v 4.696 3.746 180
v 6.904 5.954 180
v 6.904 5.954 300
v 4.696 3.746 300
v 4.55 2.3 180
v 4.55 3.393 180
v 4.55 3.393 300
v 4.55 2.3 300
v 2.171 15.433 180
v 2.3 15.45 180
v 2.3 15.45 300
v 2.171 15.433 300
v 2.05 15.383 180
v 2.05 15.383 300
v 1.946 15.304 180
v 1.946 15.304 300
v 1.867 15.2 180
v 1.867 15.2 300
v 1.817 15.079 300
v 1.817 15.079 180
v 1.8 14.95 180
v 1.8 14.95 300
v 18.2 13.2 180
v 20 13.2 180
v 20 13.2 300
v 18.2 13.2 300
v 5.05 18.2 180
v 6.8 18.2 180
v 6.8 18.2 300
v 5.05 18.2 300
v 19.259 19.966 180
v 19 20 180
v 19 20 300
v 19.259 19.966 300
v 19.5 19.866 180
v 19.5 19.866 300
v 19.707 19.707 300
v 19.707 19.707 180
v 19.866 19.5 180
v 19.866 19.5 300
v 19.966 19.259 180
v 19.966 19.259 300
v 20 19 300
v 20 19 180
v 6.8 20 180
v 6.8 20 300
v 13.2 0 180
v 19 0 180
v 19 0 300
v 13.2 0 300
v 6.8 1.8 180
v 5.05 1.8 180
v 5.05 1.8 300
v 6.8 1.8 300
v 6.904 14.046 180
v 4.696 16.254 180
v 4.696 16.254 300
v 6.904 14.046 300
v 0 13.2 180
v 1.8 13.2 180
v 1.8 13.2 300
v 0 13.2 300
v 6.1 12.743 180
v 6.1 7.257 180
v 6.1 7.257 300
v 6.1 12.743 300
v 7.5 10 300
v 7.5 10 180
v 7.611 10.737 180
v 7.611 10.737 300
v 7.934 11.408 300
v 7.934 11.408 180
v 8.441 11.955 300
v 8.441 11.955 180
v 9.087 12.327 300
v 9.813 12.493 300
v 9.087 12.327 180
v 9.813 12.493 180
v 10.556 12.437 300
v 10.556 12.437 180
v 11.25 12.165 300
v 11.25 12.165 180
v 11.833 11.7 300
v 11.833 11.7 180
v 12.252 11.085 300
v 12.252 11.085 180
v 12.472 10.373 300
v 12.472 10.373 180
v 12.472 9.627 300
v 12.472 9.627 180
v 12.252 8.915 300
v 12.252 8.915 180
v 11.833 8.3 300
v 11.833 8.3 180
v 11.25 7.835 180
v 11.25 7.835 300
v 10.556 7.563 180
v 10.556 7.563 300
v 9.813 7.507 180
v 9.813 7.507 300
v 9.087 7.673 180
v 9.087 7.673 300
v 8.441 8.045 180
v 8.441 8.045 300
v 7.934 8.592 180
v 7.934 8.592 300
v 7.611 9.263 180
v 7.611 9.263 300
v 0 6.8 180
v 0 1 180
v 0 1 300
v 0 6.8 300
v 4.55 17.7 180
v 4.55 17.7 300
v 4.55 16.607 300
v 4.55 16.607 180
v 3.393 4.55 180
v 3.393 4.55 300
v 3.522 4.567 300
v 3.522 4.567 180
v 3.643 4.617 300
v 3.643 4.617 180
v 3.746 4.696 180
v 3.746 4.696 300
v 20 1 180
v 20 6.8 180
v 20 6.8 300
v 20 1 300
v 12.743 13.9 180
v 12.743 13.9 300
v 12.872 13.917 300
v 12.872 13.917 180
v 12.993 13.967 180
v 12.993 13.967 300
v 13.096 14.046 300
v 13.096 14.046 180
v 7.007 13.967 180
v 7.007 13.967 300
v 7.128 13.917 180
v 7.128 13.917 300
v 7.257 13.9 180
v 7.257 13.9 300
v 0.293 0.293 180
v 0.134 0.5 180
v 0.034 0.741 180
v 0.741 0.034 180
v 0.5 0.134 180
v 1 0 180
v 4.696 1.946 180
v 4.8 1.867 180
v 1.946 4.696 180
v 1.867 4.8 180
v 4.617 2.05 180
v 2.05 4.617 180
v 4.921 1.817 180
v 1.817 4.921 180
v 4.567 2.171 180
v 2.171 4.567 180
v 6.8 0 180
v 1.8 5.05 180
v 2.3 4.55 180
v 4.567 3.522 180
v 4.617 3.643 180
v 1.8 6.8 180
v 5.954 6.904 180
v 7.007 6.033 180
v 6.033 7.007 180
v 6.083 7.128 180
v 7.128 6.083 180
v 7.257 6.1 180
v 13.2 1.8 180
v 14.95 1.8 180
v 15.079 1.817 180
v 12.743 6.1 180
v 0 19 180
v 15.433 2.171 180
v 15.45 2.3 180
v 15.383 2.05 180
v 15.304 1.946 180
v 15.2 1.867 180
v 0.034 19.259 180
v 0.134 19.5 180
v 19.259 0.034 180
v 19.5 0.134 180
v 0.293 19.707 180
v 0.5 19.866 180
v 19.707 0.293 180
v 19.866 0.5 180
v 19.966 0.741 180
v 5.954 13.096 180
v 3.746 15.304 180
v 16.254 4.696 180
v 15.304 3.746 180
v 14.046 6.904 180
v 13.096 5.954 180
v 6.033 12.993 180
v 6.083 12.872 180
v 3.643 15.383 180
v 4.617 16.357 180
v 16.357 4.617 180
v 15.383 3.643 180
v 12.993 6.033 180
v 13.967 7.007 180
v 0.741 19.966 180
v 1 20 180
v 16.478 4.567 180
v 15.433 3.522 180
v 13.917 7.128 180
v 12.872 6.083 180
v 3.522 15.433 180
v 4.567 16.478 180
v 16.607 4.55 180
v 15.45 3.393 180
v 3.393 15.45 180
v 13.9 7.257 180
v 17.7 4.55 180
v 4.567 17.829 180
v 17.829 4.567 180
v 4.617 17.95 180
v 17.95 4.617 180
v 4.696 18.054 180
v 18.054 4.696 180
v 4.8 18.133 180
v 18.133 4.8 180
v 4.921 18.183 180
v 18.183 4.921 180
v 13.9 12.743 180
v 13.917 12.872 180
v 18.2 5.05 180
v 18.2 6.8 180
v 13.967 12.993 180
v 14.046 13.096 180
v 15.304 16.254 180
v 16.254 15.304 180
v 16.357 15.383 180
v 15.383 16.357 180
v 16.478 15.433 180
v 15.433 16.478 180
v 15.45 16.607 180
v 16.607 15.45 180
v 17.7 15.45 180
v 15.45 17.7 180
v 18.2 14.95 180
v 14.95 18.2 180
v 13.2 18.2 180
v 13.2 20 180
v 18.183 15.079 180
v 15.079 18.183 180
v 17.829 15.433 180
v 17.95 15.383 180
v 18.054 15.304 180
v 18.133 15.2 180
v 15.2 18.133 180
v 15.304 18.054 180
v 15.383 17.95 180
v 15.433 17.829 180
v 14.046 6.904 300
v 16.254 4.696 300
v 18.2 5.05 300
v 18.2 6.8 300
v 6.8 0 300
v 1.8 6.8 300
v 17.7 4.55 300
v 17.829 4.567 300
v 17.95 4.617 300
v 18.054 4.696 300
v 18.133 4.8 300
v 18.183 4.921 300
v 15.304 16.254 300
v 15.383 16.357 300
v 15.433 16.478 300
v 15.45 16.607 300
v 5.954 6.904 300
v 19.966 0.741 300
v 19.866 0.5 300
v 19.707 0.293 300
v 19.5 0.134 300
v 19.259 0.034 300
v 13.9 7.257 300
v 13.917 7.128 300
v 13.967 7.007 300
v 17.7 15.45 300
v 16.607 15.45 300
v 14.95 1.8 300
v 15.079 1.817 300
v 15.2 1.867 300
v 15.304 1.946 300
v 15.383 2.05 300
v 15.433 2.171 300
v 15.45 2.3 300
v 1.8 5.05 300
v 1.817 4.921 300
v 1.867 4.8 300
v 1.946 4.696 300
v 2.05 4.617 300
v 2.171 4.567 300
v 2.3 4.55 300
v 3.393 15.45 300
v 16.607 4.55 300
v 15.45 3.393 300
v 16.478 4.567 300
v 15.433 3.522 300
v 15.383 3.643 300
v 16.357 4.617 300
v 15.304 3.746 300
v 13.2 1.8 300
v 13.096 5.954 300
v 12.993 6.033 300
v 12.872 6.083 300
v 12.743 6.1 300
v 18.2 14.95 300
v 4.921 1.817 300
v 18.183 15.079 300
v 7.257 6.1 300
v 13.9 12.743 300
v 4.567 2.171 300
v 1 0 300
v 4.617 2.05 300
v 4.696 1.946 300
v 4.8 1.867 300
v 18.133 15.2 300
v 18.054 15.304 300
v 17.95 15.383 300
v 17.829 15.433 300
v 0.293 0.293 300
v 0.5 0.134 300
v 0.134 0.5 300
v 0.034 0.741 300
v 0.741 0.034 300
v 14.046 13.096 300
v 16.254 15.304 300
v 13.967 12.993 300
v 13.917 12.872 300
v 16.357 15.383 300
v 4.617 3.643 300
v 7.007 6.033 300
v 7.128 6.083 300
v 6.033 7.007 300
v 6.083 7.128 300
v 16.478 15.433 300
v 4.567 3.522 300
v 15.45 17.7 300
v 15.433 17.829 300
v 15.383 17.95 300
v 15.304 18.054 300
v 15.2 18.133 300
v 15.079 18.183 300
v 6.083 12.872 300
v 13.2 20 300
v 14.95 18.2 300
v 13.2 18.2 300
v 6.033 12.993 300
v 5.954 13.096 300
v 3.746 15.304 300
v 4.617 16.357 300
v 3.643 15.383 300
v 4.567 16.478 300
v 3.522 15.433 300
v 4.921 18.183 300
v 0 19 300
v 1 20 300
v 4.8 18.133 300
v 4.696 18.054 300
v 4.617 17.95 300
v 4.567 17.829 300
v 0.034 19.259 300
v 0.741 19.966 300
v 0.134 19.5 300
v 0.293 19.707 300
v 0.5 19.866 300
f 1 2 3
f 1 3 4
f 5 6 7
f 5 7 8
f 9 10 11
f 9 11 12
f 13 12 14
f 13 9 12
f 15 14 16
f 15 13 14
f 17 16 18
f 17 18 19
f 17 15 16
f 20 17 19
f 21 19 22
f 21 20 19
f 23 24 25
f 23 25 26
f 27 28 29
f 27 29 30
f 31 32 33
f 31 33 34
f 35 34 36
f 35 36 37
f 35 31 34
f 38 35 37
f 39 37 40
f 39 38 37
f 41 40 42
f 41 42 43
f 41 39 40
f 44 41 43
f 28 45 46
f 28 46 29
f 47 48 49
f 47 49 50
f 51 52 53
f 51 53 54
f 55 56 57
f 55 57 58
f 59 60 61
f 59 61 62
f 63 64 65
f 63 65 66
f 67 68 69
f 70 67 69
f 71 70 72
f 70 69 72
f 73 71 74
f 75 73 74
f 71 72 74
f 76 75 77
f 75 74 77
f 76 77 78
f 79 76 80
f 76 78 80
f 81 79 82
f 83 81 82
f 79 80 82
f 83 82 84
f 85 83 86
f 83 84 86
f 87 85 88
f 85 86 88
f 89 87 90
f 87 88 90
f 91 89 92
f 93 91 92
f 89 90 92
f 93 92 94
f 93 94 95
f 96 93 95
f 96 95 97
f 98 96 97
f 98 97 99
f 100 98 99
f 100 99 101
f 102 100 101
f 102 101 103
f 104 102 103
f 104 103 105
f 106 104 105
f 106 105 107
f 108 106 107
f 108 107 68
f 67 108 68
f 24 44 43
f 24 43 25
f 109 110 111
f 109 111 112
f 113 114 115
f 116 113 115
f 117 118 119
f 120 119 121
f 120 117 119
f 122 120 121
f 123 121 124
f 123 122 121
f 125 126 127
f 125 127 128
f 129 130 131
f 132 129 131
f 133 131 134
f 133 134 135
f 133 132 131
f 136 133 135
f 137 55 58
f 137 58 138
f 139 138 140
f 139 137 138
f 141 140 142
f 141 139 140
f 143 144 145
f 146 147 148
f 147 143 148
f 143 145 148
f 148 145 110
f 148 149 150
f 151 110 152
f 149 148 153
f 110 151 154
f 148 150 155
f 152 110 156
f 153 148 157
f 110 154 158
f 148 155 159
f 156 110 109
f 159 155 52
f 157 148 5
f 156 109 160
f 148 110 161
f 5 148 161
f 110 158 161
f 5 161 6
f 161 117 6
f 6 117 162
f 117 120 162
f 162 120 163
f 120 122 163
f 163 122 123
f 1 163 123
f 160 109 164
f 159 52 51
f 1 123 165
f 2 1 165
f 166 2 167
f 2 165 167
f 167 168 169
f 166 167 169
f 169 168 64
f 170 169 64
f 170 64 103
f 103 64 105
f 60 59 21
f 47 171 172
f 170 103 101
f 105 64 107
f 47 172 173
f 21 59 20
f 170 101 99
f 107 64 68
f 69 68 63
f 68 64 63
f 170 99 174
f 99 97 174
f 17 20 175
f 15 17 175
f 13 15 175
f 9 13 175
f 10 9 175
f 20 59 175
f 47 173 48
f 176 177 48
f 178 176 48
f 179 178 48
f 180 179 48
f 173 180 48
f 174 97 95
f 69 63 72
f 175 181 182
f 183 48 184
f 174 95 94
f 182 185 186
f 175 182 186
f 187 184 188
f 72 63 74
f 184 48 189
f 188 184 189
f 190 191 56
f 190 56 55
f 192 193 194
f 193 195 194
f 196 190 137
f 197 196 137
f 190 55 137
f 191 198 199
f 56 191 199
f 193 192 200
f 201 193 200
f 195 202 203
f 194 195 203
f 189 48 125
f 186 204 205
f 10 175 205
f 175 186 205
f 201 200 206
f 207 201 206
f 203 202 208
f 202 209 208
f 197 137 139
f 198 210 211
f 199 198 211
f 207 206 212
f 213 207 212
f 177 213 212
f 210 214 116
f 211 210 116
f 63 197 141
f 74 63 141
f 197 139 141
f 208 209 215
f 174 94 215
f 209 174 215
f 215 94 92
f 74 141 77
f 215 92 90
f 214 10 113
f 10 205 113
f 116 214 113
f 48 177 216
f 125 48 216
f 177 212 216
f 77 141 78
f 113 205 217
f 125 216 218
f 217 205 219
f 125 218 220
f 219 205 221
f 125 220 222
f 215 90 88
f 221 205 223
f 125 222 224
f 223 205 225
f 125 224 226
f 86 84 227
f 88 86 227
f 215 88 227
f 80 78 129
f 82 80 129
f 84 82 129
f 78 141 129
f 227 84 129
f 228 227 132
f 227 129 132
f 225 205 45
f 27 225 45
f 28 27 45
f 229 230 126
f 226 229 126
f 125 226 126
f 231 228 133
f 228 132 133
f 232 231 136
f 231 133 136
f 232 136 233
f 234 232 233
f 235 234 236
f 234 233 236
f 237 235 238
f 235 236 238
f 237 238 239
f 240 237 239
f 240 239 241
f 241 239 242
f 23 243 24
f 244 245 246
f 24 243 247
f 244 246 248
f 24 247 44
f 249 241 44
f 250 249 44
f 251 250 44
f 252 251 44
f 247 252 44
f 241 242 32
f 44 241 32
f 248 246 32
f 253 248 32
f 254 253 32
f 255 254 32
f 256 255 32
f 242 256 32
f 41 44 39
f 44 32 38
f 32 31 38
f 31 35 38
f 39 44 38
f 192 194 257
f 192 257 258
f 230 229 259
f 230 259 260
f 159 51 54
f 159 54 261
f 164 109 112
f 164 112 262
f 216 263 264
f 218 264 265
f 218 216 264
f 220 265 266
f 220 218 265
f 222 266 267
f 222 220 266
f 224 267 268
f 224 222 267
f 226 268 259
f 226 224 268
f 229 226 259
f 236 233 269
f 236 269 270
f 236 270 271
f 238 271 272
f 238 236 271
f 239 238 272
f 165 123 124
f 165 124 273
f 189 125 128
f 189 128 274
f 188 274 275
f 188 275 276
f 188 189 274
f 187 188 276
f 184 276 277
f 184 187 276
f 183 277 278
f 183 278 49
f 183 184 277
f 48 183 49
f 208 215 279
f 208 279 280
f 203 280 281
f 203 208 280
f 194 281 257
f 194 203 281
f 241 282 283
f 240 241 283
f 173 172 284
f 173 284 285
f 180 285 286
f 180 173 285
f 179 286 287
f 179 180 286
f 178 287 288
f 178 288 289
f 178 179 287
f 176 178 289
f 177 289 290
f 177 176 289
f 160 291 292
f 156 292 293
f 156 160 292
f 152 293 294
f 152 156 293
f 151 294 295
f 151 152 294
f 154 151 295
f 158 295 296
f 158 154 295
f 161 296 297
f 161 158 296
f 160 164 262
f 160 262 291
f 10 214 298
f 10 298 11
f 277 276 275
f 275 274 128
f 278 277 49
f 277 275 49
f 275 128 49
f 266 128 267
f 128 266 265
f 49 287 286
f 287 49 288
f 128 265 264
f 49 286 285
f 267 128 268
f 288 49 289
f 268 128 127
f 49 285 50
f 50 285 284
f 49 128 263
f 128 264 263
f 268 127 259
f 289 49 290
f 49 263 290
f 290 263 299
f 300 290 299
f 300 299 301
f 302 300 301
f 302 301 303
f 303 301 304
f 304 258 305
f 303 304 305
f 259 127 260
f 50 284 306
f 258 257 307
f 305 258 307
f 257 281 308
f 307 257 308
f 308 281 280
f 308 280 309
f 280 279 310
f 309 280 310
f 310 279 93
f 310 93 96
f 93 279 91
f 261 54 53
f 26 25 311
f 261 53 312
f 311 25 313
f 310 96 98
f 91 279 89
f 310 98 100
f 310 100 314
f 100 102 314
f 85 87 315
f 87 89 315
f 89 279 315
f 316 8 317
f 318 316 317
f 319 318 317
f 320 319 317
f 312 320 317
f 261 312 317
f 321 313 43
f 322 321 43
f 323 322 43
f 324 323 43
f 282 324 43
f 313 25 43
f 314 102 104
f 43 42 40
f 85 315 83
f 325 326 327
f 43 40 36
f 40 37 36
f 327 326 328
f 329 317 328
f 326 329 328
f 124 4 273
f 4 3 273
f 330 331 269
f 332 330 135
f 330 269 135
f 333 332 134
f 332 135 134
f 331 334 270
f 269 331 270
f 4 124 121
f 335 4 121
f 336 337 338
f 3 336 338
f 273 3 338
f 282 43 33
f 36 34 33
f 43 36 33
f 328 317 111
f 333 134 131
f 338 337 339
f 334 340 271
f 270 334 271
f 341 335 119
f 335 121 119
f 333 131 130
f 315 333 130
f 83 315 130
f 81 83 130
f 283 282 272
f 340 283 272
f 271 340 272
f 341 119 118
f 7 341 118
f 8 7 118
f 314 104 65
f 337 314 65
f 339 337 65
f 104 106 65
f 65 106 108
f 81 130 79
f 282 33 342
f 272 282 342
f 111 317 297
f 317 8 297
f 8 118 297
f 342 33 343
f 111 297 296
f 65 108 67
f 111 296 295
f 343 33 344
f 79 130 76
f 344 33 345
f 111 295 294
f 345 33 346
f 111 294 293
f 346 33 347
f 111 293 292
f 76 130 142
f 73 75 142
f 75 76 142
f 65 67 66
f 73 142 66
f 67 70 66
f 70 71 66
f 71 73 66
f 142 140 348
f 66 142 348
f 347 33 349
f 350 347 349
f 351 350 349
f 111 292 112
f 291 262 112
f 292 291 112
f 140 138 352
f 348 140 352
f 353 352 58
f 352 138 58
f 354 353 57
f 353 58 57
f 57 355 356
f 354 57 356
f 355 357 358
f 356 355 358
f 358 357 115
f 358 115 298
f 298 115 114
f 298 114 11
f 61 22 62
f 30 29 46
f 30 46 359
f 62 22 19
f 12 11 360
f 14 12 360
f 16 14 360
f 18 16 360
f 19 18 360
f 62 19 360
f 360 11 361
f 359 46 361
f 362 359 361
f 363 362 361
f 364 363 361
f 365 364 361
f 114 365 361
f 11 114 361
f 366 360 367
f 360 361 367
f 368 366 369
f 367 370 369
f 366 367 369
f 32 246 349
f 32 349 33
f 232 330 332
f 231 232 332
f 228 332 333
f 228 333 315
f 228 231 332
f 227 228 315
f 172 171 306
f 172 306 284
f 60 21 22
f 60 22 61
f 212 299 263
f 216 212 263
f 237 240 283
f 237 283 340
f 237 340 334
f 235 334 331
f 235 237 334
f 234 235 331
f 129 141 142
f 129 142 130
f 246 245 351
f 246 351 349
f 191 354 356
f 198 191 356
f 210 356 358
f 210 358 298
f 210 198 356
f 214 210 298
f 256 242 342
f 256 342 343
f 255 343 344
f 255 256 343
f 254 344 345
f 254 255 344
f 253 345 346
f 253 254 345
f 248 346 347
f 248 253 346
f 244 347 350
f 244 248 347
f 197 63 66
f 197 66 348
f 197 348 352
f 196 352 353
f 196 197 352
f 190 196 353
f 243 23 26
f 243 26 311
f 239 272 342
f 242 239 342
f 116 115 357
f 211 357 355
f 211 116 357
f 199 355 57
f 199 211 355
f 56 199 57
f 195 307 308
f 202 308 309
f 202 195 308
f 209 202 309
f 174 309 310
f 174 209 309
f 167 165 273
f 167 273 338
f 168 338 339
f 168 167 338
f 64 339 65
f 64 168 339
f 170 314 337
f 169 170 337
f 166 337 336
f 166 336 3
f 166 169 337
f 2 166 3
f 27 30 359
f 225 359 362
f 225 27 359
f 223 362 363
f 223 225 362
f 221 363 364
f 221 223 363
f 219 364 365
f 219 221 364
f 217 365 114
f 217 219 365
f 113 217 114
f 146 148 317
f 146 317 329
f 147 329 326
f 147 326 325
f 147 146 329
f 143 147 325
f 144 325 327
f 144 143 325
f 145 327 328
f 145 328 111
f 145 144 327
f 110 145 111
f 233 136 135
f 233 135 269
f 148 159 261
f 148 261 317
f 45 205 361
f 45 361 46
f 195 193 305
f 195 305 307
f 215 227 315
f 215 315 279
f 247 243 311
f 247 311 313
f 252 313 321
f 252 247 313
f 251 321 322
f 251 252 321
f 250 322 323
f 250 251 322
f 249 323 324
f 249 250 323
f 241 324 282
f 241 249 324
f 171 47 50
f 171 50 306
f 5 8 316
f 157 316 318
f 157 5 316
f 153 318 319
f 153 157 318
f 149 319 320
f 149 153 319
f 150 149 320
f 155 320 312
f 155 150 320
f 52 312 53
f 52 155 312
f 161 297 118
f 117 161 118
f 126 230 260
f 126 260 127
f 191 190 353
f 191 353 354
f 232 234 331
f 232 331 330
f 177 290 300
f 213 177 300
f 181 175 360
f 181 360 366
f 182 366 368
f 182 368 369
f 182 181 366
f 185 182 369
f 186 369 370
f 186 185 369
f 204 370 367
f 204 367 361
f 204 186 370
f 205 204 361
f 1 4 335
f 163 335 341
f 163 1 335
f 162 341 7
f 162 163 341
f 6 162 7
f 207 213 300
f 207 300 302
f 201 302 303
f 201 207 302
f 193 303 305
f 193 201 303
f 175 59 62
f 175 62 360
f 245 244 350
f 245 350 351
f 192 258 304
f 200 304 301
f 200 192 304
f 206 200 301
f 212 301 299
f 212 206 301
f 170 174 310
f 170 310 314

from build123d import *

# Parameters (mm, degrees)
SKETCH1_R           = 2.5
BOSS_EXTRUDE1_DEPTH = 300
SKETCH2_W           = 20
SKETCH2_H           = 180
CUT_EXTRUDE1_DEPTH  = 30


with BuildPart() as part:
    # Sketch1 → Boss-Extrude1 (new body)
    with BuildSketch(Plane(origin=(0, 0, 0), x_dir=(-1, 0, 0), z_dir=(0, 0, -1))):
        with BuildLine():
            Line((-20, 19), (-20, 13.2))
            Line((-20, 13.2), (-18.2, 13.2))
            Line((-18.2, 13.2), (-18.2, 14.95))
            ThreePointArc((-18.2, 14.95), (-18.053553391, 15.303553391), (-17.7, 15.45))
            Line((-17.7, 15.45), (-16.607106781, 15.45))
            ThreePointArc((-16.607106781, 15.45), (-16.415765065, 15.411939766), (-16.253553391, 15.303553391))
            Line((-16.253553391, 15.303553391), (-14.046446609, 13.096446609))
            ThreePointArc((-14.046446609, 13.096446609), (-13.938060234, 12.934234935), (-13.9, 12.742893219))
            Line((-13.9, 12.742893219), (-13.9, 7.257106781))
            ThreePointArc((-13.9, 7.257106781), (-13.938060234, 7.065765065), (-14.046446609, 6.903553391))
            Line((-14.046446609, 6.903553391), (-16.253553391, 4.696446609))
            ThreePointArc((-16.253553391, 4.696446609), (-16.415765065, 4.588060234), (-16.607106781, 4.55))
            Line((-16.607106781, 4.55), (-17.7, 4.55))
            ThreePointArc((-17.7, 4.55), (-18.053553391, 4.696446609), (-18.2, 5.05))
            Line((-18.2, 5.05), (-18.2, 6.8))
            Line((-18.2, 6.8), (-20, 6.8))
            Line((-20, 6.8), (-20, 1))
            ThreePointArc((-20, 1), (-19.707106781, 0.292893219), (-19, 0))
            Line((-19, 0), (-13.2, 0))
            Line((-13.2, 0), (-13.2, 1.8))
            Line((-13.2, 1.8), (-14.95, 1.8))
            ThreePointArc((-14.95, 1.8), (-15.303553391, 1.946446609), (-15.45, 2.3))
            Line((-15.45, 2.3), (-15.45, 3.392893219))
            ThreePointArc((-15.45, 3.392893219), (-15.411939766, 3.584234935), (-15.303553391, 3.746446609))
            Line((-15.303553391, 3.746446609), (-13.096446609, 5.953553391))
            ThreePointArc((-13.096446609, 5.953553391), (-12.934234935, 6.061939766), (-12.742893219, 6.1))
            Line((-12.742893219, 6.1), (-7.257106781, 6.1))
            ThreePointArc((-7.257106781, 6.1), (-7.065765065, 6.061939766), (-6.903553391, 5.953553391))
            Line((-6.903553391, 5.953553391), (-4.696446609, 3.746446609))
            ThreePointArc((-4.696446609, 3.746446609), (-4.588060234, 3.584234935), (-4.55, 3.392893219))
            Line((-4.55, 3.392893219), (-4.55, 2.3))
            ThreePointArc((-4.55, 2.3), (-4.696446609, 1.946446609), (-5.05, 1.8))
            Line((-5.05, 1.8), (-6.8, 1.8))
            Line((-6.8, 1.8), (-6.8, 0))
            Line((-6.8, 0), (-1, 0))
            ThreePointArc((-1, 0), (-0.292893219, 0.292893219), (0, 1))
            Line((0, 1), (0, 6.8))
            Line((0, 6.8), (-1.8, 6.8))
            Line((-1.8, 6.8), (-1.8, 5.05))
            ThreePointArc((-1.8, 5.05), (-1.946446609, 4.696446609), (-2.3, 4.55))
            Line((-2.3, 4.55), (-3.392893219, 4.55))
            ThreePointArc((-3.392893219, 4.55), (-3.584234935, 4.588060234), (-3.746446609, 4.696446609))
            Line((-3.746446609, 4.696446609), (-5.953553391, 6.903553391))
            ThreePointArc((-5.953553391, 6.903553391), (-6.061939766, 7.065765065), (-6.1, 7.257106781))
            Line((-6.1, 7.257106781), (-6.1, 12.742893219))
            ThreePointArc((-6.1, 12.742893219), (-6.061939766, 12.934234935), (-5.953553391, 13.096446609))
            Line((-5.953553391, 13.096446609), (-3.746446609, 15.303553391))
            ThreePointArc((-3.746446609, 15.303553391), (-3.584234935, 15.411939766), (-3.392893219, 15.45))
            Line((-3.392893219, 15.45), (-2.3, 15.45))
            ThreePointArc((-2.3, 15.45), (-1.946446609, 15.303553391), (-1.8, 14.95))
            Line((-1.8, 14.95), (-1.8, 13.2))
            Line((-1.8, 13.2), (0, 13.2))
            Line((0, 13.2), (0, 19))
            ThreePointArc((0, 19), (-0.292893219, 19.707106781), (-1, 20))
            Line((-1, 20), (-6.8, 20))
            Line((-6.8, 20), (-6.8, 18.2))
            Line((-6.8, 18.2), (-5.05, 18.2))
            ThreePointArc((-5.05, 18.2), (-4.696446609, 18.053553391), (-4.55, 17.7))
            Line((-4.55, 17.7), (-4.55, 16.607106781))
            ThreePointArc((-4.55, 16.607106781), (-4.588060234, 16.415765065), (-4.696446609, 16.253553391))
            Line((-4.696446609, 16.253553391), (-6.903553391, 14.046446609))
            ThreePointArc((-6.903553391, 14.046446609), (-7.065765065, 13.938060234), (-7.257106781, 13.9))
            Line((-7.257106781, 13.9), (-12.742893219, 13.9))
            ThreePointArc((-12.742893219, 13.9), (-12.934234935, 13.938060234), (-13.096446609, 14.046446609))
            Line((-13.096446609, 14.046446609), (-15.303553391, 16.253553391))
            ThreePointArc((-15.303553391, 16.253553391), (-15.411939766, 16.415765065), (-15.45, 16.607106781))
            Line((-15.45, 16.607106781), (-15.45, 17.7))
            ThreePointArc((-15.45, 17.7), (-15.303553391, 18.053553391), (-14.95, 18.2))
            Line((-14.95, 18.2), (-13.2, 18.2))
            Line((-13.2, 18.2), (-13.2, 20))
            Line((-13.2, 20), (-19, 20))
            ThreePointArc((-19, 20), (-19.707106781, 19.707106781), (-20, 19))
        make_face()
        with Locations((-10, 10)):
            Circle(SKETCH1_R, mode=Mode.SUBTRACT)
    extrude(amount=-BOSS_EXTRUDE1_DEPTH)

    # Sketch2 → Cut-Extrude1 (cut)
    with BuildSketch(Plane(origin=(0, 20, 0), x_dir=(1, 0, 0), z_dir=(0, 1, 0))):
        with Locations((10, -90)):
            Rectangle(SKETCH2_W, SKETCH2_H)
    extrude(amount=-CUT_EXTRUDE1_DEPTH, mode=Mode.SUBTRACT)


solid = part.part
